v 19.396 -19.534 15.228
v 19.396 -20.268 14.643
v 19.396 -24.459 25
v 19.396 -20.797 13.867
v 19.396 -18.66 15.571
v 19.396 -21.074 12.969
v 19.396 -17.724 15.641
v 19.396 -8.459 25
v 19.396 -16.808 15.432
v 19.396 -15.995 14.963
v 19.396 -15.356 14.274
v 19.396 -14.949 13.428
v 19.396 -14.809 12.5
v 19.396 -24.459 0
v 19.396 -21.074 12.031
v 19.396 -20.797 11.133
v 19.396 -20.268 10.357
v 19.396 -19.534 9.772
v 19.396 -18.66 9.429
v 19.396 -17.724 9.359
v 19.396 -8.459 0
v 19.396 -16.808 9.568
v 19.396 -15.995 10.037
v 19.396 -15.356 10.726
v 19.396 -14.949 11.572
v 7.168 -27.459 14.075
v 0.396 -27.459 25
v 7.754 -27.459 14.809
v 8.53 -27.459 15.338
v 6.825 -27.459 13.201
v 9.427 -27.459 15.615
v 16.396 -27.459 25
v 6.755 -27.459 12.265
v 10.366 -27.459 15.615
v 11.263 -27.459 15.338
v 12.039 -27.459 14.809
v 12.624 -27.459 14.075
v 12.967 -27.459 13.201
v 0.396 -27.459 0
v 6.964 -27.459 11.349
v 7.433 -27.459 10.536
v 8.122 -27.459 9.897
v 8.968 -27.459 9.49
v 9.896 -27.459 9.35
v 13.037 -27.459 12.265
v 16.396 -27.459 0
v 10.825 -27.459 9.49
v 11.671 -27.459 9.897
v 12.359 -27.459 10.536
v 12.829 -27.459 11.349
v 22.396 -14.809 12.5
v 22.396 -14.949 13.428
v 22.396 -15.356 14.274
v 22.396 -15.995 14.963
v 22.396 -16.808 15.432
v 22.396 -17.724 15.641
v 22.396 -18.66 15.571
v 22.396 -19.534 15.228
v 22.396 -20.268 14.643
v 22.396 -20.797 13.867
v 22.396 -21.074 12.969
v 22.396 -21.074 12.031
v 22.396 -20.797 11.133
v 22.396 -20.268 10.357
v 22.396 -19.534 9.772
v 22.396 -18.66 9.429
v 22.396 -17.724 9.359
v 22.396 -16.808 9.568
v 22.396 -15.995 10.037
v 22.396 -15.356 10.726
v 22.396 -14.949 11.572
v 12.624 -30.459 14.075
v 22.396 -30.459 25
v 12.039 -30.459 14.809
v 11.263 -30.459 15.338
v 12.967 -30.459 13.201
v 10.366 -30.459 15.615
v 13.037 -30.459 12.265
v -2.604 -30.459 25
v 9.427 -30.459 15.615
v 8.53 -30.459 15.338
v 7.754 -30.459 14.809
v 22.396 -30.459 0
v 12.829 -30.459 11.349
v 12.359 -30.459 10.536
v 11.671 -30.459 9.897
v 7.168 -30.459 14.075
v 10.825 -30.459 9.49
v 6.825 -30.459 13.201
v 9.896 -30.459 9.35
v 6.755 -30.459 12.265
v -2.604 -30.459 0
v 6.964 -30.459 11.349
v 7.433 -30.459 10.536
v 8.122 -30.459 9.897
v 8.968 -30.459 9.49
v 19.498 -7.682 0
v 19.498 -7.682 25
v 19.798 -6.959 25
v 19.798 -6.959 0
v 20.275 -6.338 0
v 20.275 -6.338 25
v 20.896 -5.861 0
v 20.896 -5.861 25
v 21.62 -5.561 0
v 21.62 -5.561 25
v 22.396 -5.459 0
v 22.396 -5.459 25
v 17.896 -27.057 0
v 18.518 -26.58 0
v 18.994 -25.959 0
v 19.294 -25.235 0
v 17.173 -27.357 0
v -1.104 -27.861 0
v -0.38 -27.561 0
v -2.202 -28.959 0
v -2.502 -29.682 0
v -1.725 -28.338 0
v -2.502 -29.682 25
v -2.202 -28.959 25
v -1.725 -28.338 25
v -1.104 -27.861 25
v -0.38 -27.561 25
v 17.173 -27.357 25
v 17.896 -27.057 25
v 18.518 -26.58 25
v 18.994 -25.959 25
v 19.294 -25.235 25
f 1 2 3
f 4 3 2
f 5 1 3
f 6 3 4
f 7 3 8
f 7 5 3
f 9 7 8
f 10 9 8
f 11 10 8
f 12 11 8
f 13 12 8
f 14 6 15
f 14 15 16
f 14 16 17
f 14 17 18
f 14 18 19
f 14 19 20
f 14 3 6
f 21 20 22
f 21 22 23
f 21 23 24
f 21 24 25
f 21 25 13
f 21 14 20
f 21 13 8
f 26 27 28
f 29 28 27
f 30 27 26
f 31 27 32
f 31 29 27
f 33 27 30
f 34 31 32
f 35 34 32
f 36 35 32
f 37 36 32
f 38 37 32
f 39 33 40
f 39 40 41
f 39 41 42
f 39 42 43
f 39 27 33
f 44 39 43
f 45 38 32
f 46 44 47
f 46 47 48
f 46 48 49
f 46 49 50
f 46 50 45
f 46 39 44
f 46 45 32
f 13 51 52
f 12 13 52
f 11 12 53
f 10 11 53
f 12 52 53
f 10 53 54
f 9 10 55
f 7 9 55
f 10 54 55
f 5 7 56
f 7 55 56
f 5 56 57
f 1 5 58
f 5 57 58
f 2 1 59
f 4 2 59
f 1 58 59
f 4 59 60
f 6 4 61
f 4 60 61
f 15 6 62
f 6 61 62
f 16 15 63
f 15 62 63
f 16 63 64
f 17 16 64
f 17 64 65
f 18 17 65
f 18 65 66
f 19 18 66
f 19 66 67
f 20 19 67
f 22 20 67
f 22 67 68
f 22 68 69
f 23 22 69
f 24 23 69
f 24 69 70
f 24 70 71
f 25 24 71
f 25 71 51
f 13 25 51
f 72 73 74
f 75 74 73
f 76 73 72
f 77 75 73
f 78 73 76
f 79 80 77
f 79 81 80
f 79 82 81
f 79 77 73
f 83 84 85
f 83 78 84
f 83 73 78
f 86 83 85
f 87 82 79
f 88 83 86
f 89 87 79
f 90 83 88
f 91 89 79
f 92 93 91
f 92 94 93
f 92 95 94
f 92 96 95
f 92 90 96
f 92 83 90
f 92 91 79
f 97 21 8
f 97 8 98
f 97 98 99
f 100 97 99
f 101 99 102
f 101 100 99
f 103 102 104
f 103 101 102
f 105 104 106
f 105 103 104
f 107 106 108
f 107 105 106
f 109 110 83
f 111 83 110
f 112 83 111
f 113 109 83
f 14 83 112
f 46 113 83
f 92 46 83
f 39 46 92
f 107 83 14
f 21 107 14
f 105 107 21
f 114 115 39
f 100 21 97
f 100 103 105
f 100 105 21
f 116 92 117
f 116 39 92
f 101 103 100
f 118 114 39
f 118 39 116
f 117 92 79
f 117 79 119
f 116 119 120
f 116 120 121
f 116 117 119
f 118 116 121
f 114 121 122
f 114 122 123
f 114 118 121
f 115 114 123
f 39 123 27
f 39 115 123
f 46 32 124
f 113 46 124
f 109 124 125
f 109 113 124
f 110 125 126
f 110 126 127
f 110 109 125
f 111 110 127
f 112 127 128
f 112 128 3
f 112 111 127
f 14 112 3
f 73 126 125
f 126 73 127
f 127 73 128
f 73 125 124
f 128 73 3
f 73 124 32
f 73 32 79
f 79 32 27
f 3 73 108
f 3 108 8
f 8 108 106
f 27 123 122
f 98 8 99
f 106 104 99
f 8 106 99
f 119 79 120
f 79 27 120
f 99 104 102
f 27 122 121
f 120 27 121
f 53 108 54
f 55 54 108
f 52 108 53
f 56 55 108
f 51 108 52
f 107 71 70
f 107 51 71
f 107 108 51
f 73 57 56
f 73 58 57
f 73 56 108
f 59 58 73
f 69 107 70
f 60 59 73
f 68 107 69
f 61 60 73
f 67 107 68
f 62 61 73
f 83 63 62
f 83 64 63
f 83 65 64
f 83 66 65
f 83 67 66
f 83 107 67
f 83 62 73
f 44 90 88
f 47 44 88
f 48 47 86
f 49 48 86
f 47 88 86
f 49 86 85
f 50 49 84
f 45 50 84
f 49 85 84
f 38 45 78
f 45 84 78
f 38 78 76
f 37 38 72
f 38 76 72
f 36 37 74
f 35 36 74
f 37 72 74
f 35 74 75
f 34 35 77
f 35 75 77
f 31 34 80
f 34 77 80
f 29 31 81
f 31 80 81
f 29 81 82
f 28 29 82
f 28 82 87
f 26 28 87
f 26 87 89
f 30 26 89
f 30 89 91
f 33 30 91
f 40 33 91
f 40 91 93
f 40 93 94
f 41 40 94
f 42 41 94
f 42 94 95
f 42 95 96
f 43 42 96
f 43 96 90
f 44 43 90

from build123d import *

# Parameters (mm, degrees)
EXTRUDE1_DEPTH     = 25
SKETCH2_R          = 3.15
CUT_EXTRUDE1_DEPTH = 25
SKETCH3_R          = 3.15
CUT_EXTRUDE2_DEPTH = 25


with BuildPart() as part:
    # Sketch1 → Extrude1 (new body)
    with BuildSketch(Plane.XY):
        with BuildLine():
            Line((22.39626556, -5.458921162), (22.39626556, -30.458921162))
            Line((22.39626556, -30.458921162), (-2.60373444, -30.458921162))
            ThreePointArc((-2.60373444, -30.458921162), (-1.725054783, -28.337600818), (0.39626556, -27.458921162))
            Line((0.39626556, -27.458921162), (16.39626556, -27.458921162))
            ThreePointArc((16.39626556, -27.458921162), (18.517585904, -26.580241505), (19.39626556, -24.458921162))
            Line((19.39626556, -24.458921162), (19.39626556, -8.458921162))
            ThreePointArc((19.39626556, -8.458921162), (20.274945217, -6.337600818), (22.39626556, -5.458921162))
        make_face()
    extrude(amount=EXTRUDE1_DEPTH)

    # Sketch2 → Cut-Extrude1 (cut)
    with BuildSketch(Plane(origin=(22.39626556, 0, 0), x_dir=(0, 0, -1), z_dir=(1, 0, 0))):
        with Locations(Location((-12.5, -17.958921162, 0), (0, 0, 90))):
            Circle(SKETCH2_R)
    extrude(amount=-CUT_EXTRUDE1_DEPTH, mode=Mode.SUBTRACT)

    # Sketch3 → Cut-Extrude2 (cut)
    with BuildSketch(Plane.XZ.offset(30.458921162)):
        with Locations(Location((9.89626556, 12.5, 0), (0, 0, 270))):
            Circle(SKETCH3_R)
    extrude(amount=-CUT_EXTRUDE2_DEPTH, mode=Mode.SUBTRACT)


solid = part.part
